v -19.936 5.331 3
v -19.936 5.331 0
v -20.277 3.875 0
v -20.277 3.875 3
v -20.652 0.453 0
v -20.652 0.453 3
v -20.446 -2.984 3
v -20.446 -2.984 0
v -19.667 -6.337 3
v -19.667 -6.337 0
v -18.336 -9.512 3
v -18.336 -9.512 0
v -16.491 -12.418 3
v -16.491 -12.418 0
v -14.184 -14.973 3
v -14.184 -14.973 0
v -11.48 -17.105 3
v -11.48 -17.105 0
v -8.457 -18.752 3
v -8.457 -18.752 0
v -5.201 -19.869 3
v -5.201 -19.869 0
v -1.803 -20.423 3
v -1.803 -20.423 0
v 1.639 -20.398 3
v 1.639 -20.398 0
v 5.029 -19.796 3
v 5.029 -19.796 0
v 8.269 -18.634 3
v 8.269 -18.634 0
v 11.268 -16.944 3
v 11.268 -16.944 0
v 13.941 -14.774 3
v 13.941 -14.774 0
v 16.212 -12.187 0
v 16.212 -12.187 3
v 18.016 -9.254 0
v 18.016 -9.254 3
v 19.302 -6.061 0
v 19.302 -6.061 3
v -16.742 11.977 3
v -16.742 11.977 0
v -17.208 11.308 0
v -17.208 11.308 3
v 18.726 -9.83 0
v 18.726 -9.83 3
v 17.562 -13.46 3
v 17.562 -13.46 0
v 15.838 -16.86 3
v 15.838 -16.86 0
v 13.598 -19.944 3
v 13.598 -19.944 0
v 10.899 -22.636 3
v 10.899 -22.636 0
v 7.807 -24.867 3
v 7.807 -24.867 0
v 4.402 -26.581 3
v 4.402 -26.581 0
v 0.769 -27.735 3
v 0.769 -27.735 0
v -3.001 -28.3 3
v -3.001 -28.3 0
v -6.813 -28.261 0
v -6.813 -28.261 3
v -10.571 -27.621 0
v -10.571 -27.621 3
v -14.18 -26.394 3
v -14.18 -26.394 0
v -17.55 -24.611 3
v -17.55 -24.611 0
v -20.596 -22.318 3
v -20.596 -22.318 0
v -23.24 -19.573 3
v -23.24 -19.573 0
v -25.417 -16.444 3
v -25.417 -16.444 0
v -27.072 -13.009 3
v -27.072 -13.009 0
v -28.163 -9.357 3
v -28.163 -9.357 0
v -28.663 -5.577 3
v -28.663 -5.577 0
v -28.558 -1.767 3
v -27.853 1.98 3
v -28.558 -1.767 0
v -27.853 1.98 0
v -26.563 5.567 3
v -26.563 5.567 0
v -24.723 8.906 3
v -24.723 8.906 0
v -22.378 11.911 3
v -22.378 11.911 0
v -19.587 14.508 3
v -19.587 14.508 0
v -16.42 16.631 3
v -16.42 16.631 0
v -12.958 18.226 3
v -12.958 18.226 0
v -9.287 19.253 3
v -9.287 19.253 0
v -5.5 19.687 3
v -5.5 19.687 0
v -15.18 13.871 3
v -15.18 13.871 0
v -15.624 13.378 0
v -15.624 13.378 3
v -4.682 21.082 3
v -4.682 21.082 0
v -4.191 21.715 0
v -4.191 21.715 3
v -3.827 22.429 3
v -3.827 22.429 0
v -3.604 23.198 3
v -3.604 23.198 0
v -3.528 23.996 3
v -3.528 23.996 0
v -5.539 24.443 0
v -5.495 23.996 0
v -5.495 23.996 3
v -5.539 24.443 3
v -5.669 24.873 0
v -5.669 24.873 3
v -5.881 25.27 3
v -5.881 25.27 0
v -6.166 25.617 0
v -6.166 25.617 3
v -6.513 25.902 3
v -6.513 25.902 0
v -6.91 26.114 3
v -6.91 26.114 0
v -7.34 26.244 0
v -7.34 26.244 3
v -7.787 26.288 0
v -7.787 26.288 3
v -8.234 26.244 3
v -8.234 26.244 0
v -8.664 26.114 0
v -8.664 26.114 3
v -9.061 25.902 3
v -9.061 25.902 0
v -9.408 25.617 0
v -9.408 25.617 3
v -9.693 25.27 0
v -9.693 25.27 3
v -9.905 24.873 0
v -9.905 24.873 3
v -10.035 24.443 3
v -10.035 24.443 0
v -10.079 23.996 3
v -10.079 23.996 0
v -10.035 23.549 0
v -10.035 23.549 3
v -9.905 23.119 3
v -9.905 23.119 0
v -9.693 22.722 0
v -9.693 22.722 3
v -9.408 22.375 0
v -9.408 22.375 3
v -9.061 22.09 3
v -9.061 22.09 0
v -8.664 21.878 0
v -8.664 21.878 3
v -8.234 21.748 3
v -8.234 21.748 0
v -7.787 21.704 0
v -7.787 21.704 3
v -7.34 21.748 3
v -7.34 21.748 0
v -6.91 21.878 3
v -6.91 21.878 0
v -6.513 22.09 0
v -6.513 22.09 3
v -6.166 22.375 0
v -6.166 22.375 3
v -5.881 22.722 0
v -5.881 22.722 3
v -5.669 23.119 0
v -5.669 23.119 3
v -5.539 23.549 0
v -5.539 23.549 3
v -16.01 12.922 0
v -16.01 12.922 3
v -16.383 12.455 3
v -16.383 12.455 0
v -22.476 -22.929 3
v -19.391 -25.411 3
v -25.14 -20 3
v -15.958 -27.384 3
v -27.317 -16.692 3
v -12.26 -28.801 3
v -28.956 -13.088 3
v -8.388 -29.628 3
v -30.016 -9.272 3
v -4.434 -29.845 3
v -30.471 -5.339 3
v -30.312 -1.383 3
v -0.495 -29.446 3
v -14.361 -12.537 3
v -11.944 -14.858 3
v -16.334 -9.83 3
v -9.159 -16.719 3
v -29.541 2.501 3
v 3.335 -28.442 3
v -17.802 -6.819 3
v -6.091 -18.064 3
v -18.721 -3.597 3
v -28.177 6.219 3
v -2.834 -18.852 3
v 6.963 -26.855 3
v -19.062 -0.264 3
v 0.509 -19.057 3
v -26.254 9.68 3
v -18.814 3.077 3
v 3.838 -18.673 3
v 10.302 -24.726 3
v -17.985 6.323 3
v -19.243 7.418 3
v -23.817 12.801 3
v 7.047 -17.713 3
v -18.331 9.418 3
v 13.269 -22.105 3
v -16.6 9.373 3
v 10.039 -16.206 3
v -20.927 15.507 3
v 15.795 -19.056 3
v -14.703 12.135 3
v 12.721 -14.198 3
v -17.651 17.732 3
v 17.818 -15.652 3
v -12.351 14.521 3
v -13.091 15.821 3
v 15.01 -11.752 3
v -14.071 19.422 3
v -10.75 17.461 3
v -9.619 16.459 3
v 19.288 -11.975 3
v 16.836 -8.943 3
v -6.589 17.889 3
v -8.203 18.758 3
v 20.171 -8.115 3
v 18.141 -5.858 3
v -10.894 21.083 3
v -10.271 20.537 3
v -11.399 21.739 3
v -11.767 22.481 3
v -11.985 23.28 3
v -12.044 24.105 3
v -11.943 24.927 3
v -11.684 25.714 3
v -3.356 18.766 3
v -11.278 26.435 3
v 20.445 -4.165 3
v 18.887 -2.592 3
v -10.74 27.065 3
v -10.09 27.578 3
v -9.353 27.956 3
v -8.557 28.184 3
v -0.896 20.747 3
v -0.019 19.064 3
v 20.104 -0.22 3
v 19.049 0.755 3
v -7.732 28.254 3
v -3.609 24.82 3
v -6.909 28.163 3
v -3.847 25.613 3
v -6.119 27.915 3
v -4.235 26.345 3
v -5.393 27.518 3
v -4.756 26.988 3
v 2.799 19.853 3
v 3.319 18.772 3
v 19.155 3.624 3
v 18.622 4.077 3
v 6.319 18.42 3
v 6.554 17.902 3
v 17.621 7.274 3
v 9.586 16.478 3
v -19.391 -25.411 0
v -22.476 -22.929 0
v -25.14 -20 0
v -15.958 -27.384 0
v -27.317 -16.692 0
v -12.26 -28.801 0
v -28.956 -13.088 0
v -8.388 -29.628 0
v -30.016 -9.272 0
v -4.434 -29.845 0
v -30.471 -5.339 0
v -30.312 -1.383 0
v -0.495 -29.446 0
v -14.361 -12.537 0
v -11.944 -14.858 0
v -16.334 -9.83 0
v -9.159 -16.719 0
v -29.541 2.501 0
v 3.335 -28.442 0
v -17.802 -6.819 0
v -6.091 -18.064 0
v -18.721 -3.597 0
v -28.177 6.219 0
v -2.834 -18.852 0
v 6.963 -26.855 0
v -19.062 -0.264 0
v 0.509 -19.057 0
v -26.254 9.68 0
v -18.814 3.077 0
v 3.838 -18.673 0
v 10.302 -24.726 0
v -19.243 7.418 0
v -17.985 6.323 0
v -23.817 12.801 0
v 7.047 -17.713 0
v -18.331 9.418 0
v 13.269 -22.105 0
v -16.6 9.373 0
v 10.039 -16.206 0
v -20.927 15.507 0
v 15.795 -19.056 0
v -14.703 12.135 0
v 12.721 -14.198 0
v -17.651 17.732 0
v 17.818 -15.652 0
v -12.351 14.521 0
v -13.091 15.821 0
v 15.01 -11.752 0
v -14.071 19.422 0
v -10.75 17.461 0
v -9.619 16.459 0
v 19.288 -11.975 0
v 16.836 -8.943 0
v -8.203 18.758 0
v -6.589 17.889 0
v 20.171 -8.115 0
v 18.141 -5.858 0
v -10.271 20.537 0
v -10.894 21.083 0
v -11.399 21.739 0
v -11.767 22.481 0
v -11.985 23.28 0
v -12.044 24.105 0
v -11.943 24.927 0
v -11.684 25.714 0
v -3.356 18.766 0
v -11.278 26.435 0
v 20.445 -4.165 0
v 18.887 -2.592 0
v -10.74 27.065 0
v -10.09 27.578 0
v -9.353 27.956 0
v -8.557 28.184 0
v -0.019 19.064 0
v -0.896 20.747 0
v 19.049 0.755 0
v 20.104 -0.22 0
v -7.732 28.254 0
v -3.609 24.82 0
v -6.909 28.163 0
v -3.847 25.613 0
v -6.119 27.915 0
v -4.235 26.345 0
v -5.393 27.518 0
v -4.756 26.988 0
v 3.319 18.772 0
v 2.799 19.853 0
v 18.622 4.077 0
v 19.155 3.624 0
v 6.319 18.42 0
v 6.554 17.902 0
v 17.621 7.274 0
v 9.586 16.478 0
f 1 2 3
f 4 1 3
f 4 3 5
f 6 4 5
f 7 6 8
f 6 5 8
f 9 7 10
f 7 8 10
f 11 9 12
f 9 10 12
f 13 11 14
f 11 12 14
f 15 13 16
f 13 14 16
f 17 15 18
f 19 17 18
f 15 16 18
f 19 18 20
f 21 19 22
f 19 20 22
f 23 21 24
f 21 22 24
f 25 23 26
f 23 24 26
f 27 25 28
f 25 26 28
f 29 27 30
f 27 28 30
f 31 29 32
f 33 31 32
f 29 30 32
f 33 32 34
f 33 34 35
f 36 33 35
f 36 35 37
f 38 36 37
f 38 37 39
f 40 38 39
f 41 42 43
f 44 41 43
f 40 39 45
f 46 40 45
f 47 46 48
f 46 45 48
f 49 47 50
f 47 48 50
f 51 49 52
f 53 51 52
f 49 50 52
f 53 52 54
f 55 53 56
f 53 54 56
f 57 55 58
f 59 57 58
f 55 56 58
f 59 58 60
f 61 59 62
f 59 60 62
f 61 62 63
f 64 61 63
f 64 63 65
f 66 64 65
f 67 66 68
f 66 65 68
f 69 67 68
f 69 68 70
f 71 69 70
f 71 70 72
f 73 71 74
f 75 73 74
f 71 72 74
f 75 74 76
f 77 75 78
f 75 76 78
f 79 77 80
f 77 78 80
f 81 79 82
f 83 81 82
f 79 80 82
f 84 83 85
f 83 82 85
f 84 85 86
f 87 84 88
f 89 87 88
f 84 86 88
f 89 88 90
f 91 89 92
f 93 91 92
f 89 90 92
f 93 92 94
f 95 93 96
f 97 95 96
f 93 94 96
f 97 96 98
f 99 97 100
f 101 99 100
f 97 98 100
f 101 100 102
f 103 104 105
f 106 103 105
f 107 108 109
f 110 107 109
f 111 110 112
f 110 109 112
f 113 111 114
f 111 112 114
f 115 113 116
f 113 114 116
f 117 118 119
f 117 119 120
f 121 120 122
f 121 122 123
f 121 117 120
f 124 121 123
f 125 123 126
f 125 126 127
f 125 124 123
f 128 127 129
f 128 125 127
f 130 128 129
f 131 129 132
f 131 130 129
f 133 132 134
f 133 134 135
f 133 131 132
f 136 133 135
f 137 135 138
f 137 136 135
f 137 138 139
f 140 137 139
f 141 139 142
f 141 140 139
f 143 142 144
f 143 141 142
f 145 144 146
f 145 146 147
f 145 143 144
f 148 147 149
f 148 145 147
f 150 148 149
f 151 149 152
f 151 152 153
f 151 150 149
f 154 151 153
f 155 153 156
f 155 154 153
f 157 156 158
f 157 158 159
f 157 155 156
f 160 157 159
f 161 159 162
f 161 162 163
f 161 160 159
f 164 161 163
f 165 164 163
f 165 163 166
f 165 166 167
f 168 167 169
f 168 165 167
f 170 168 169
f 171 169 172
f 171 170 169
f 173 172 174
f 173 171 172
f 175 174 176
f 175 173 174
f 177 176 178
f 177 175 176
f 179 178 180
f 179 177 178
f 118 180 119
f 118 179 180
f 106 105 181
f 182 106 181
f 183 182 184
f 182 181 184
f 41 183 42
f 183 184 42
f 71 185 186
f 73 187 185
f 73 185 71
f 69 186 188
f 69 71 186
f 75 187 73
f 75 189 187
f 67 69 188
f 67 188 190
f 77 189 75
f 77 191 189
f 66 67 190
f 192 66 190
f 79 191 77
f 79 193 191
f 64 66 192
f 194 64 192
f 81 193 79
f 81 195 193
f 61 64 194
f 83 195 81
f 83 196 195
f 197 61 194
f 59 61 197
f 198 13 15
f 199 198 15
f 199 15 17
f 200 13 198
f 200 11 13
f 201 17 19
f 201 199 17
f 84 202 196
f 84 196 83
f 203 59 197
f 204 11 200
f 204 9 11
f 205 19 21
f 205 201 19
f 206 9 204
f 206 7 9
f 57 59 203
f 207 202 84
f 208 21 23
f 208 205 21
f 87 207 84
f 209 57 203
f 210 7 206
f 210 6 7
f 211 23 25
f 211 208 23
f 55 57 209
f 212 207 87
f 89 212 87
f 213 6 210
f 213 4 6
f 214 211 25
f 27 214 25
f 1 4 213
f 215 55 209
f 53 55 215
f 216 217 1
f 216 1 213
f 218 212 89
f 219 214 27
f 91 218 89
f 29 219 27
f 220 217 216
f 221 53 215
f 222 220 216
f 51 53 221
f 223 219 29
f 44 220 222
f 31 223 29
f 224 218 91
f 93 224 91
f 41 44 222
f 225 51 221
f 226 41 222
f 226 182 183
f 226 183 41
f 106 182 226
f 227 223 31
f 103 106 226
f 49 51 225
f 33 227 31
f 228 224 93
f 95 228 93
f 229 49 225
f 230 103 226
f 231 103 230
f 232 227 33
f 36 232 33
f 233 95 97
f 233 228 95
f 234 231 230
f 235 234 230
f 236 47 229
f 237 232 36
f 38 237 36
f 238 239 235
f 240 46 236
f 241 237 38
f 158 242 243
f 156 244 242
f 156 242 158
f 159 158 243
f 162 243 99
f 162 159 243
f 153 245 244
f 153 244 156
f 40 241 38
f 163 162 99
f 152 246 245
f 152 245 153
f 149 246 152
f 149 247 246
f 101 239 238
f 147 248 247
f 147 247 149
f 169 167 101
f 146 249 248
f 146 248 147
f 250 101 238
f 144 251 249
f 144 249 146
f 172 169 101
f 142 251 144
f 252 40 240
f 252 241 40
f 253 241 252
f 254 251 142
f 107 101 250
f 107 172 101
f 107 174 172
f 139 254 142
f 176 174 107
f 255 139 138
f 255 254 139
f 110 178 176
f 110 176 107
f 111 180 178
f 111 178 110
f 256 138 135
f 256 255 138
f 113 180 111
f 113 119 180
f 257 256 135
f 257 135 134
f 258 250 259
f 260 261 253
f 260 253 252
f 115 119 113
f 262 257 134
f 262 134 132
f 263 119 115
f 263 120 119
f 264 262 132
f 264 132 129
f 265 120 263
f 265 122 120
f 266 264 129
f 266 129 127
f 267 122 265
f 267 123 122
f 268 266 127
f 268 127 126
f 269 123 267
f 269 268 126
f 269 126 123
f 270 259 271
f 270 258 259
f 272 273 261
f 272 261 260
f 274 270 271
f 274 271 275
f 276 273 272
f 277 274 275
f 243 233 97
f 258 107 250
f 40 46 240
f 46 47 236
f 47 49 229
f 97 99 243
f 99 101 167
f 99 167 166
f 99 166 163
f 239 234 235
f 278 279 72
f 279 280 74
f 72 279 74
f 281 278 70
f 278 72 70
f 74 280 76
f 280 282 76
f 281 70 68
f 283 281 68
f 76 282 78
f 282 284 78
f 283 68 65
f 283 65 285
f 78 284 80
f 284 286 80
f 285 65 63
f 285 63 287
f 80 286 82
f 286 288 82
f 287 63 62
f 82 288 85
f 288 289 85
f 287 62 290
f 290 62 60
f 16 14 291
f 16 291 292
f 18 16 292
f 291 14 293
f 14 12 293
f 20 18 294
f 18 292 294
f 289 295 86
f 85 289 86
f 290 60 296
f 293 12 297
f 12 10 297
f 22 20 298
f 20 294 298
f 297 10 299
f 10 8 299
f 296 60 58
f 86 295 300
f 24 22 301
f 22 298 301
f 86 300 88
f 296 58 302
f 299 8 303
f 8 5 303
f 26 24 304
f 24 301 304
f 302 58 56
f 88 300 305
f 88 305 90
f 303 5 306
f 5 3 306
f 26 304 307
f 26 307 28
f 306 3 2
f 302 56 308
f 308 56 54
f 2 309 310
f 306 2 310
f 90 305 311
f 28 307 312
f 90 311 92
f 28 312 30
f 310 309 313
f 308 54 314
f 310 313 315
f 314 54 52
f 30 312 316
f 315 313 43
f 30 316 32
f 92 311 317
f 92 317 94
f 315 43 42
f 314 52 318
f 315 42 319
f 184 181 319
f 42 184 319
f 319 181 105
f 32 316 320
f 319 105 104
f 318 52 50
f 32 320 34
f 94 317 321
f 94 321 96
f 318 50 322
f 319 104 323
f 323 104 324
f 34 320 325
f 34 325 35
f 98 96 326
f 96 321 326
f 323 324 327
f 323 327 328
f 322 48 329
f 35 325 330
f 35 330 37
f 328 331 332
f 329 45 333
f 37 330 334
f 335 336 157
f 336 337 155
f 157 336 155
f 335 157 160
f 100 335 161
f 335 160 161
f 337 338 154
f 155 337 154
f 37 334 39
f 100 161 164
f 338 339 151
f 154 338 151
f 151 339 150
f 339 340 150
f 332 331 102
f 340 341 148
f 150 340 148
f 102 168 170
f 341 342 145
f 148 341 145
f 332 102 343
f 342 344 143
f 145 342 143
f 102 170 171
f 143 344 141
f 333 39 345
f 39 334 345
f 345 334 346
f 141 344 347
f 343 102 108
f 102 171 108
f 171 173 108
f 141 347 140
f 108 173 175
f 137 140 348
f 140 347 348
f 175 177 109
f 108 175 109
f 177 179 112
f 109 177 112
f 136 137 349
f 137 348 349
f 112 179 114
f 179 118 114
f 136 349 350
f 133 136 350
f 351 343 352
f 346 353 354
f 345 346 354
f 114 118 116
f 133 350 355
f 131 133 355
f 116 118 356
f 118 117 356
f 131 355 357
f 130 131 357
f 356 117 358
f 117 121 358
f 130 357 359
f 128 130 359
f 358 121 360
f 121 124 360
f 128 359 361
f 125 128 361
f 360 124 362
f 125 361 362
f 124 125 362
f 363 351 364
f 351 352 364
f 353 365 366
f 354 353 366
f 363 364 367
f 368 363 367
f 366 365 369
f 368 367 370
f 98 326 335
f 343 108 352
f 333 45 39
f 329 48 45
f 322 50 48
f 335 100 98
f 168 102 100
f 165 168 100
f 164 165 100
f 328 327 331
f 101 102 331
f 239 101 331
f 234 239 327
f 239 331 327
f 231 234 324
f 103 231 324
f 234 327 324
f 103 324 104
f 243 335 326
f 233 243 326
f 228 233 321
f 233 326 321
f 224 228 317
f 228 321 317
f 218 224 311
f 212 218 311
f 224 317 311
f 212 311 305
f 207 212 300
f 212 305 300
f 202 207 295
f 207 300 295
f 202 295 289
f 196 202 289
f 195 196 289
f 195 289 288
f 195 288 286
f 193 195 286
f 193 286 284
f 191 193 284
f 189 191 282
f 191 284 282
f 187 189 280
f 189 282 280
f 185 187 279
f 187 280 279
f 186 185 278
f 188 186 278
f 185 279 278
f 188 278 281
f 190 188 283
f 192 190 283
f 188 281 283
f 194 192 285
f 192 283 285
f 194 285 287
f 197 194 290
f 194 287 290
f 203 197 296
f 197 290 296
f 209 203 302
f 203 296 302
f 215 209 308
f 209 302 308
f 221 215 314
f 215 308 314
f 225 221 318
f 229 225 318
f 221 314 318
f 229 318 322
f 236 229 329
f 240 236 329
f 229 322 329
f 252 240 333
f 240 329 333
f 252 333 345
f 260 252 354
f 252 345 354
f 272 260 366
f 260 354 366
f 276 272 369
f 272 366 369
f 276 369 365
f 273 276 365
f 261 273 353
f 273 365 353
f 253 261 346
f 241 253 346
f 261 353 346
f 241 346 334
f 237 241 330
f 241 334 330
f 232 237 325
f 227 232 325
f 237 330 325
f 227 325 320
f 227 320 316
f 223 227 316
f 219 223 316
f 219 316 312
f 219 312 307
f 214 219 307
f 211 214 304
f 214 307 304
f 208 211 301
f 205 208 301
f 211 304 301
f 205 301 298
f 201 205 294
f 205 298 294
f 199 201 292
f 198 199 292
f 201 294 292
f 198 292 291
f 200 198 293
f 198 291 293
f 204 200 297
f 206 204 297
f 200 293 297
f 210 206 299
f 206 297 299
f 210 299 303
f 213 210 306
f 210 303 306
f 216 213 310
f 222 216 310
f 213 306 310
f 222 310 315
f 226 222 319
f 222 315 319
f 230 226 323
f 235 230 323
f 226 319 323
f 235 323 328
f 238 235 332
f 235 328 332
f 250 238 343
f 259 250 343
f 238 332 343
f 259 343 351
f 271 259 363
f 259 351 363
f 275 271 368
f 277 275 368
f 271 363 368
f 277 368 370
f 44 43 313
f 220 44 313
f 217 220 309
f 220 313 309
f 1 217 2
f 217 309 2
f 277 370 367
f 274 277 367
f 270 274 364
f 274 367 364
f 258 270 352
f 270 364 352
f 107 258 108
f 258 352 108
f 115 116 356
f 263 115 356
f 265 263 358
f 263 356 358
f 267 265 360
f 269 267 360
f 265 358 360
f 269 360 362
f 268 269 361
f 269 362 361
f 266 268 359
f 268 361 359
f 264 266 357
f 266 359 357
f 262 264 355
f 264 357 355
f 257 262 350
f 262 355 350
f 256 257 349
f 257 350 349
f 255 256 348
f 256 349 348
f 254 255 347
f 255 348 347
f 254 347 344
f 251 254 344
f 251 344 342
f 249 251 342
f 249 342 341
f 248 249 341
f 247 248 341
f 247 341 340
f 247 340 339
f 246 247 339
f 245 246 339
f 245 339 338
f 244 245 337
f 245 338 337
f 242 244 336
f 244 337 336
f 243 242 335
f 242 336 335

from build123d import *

# Parameters (mm, degrees)
F0_R     = 2.2923424458
F1_DEPTH = 3


with BuildPart() as f1:
    # F0 (on Top) → F1 (new body)
    with BuildSketch(Plane.XY):
        with BuildLine():
            ThreePointArc((-10.2711248099, 20.5369088401), (-7.4915699128, 20.9637629982), (-4.6818986464, 21.0815648356))
            ThreePointArc((-4.6818986464, 21.0815648356), (-3.8272791749, 22.4288026174), (-3.528424334, 23.9960007114))
            ThreePointArc((-3.528424334, 23.9960007114), (-9.7309143278, 27.7851076735), (-10.2711248099, 20.5369088401))
        make_face()
        with Locations((-7.7870538317, 23.9960007114)):
            Circle(F0_R, mode=Mode.SUBTRACT)
        with BuildLine():
            ThreePointArc((-10.2711248099, 20.5369088401), (-7.3740175906, 19.7574483332), (-4.6818986464, 21.0815648356))
            ThreePointArc((-4.6818986464, 21.0815648356), (-7.4915699128, 20.9637629982), (-10.2711248099, 20.5369088401))
        make_face()
        with BuildLine():
            ThreePointArc((17.6210584616, 7.2744961396), (-14.3609161452, -12.5373076401), (9.5862937371, 16.4779539925))
            ThreePointArc((9.5862937371, 16.4779539925), (2.7986315485, 19.8534789731), (-4.6818986464, 21.0815648356))
            ThreePointArc((-4.6818986464, 21.0815648356), (-7.3740175906, 19.7574483332), (-10.2711248099, 20.5369088401))
            ThreePointArc((-10.2711248099, 20.5369088401), (-15.9577589353, -27.3838876789), (17.6210584616, 7.2744961396))
        make_face()
        with BuildLine():
            ThreePointArc((19.3017870188, -6.0611376539), (-21.9723847969, -20.9981833276), (-5.4997475818, 19.687499851))
            ThreePointArc((-5.4997475818, 19.687499851), (-10.7496275746, 17.4612976364), (-15.179797656, 13.870920318))
            Line((-15.179797656, 13.870920318), (-15.6238832555, 13.3781558918))
            ThreePointArc((-15.6238832555, 13.3781558918), (-16.1982928509, 12.6896602283), (-16.7419419606, 11.9766256516))
            Line((-16.7419419606, 11.9766256516), (-17.2084446119, 11.3084951626))
            ThreePointArc((-17.2084446119, 11.3084951626), (-18.814029944, 8.43031492), (-19.9359758104, 5.3314339541))
            Line((-19.9359758104, 5.3314339541), (-20.2770843766, 3.8746306645))
            ThreePointArc((-20.2770843766, 3.8746306645), (-5.2009908425, -19.8687278573), (19.3017870188, -6.0611376539))
        make_face(mode=Mode.SUBTRACT)
    extrude(amount=F1_DEPTH)


solid = f1.part
